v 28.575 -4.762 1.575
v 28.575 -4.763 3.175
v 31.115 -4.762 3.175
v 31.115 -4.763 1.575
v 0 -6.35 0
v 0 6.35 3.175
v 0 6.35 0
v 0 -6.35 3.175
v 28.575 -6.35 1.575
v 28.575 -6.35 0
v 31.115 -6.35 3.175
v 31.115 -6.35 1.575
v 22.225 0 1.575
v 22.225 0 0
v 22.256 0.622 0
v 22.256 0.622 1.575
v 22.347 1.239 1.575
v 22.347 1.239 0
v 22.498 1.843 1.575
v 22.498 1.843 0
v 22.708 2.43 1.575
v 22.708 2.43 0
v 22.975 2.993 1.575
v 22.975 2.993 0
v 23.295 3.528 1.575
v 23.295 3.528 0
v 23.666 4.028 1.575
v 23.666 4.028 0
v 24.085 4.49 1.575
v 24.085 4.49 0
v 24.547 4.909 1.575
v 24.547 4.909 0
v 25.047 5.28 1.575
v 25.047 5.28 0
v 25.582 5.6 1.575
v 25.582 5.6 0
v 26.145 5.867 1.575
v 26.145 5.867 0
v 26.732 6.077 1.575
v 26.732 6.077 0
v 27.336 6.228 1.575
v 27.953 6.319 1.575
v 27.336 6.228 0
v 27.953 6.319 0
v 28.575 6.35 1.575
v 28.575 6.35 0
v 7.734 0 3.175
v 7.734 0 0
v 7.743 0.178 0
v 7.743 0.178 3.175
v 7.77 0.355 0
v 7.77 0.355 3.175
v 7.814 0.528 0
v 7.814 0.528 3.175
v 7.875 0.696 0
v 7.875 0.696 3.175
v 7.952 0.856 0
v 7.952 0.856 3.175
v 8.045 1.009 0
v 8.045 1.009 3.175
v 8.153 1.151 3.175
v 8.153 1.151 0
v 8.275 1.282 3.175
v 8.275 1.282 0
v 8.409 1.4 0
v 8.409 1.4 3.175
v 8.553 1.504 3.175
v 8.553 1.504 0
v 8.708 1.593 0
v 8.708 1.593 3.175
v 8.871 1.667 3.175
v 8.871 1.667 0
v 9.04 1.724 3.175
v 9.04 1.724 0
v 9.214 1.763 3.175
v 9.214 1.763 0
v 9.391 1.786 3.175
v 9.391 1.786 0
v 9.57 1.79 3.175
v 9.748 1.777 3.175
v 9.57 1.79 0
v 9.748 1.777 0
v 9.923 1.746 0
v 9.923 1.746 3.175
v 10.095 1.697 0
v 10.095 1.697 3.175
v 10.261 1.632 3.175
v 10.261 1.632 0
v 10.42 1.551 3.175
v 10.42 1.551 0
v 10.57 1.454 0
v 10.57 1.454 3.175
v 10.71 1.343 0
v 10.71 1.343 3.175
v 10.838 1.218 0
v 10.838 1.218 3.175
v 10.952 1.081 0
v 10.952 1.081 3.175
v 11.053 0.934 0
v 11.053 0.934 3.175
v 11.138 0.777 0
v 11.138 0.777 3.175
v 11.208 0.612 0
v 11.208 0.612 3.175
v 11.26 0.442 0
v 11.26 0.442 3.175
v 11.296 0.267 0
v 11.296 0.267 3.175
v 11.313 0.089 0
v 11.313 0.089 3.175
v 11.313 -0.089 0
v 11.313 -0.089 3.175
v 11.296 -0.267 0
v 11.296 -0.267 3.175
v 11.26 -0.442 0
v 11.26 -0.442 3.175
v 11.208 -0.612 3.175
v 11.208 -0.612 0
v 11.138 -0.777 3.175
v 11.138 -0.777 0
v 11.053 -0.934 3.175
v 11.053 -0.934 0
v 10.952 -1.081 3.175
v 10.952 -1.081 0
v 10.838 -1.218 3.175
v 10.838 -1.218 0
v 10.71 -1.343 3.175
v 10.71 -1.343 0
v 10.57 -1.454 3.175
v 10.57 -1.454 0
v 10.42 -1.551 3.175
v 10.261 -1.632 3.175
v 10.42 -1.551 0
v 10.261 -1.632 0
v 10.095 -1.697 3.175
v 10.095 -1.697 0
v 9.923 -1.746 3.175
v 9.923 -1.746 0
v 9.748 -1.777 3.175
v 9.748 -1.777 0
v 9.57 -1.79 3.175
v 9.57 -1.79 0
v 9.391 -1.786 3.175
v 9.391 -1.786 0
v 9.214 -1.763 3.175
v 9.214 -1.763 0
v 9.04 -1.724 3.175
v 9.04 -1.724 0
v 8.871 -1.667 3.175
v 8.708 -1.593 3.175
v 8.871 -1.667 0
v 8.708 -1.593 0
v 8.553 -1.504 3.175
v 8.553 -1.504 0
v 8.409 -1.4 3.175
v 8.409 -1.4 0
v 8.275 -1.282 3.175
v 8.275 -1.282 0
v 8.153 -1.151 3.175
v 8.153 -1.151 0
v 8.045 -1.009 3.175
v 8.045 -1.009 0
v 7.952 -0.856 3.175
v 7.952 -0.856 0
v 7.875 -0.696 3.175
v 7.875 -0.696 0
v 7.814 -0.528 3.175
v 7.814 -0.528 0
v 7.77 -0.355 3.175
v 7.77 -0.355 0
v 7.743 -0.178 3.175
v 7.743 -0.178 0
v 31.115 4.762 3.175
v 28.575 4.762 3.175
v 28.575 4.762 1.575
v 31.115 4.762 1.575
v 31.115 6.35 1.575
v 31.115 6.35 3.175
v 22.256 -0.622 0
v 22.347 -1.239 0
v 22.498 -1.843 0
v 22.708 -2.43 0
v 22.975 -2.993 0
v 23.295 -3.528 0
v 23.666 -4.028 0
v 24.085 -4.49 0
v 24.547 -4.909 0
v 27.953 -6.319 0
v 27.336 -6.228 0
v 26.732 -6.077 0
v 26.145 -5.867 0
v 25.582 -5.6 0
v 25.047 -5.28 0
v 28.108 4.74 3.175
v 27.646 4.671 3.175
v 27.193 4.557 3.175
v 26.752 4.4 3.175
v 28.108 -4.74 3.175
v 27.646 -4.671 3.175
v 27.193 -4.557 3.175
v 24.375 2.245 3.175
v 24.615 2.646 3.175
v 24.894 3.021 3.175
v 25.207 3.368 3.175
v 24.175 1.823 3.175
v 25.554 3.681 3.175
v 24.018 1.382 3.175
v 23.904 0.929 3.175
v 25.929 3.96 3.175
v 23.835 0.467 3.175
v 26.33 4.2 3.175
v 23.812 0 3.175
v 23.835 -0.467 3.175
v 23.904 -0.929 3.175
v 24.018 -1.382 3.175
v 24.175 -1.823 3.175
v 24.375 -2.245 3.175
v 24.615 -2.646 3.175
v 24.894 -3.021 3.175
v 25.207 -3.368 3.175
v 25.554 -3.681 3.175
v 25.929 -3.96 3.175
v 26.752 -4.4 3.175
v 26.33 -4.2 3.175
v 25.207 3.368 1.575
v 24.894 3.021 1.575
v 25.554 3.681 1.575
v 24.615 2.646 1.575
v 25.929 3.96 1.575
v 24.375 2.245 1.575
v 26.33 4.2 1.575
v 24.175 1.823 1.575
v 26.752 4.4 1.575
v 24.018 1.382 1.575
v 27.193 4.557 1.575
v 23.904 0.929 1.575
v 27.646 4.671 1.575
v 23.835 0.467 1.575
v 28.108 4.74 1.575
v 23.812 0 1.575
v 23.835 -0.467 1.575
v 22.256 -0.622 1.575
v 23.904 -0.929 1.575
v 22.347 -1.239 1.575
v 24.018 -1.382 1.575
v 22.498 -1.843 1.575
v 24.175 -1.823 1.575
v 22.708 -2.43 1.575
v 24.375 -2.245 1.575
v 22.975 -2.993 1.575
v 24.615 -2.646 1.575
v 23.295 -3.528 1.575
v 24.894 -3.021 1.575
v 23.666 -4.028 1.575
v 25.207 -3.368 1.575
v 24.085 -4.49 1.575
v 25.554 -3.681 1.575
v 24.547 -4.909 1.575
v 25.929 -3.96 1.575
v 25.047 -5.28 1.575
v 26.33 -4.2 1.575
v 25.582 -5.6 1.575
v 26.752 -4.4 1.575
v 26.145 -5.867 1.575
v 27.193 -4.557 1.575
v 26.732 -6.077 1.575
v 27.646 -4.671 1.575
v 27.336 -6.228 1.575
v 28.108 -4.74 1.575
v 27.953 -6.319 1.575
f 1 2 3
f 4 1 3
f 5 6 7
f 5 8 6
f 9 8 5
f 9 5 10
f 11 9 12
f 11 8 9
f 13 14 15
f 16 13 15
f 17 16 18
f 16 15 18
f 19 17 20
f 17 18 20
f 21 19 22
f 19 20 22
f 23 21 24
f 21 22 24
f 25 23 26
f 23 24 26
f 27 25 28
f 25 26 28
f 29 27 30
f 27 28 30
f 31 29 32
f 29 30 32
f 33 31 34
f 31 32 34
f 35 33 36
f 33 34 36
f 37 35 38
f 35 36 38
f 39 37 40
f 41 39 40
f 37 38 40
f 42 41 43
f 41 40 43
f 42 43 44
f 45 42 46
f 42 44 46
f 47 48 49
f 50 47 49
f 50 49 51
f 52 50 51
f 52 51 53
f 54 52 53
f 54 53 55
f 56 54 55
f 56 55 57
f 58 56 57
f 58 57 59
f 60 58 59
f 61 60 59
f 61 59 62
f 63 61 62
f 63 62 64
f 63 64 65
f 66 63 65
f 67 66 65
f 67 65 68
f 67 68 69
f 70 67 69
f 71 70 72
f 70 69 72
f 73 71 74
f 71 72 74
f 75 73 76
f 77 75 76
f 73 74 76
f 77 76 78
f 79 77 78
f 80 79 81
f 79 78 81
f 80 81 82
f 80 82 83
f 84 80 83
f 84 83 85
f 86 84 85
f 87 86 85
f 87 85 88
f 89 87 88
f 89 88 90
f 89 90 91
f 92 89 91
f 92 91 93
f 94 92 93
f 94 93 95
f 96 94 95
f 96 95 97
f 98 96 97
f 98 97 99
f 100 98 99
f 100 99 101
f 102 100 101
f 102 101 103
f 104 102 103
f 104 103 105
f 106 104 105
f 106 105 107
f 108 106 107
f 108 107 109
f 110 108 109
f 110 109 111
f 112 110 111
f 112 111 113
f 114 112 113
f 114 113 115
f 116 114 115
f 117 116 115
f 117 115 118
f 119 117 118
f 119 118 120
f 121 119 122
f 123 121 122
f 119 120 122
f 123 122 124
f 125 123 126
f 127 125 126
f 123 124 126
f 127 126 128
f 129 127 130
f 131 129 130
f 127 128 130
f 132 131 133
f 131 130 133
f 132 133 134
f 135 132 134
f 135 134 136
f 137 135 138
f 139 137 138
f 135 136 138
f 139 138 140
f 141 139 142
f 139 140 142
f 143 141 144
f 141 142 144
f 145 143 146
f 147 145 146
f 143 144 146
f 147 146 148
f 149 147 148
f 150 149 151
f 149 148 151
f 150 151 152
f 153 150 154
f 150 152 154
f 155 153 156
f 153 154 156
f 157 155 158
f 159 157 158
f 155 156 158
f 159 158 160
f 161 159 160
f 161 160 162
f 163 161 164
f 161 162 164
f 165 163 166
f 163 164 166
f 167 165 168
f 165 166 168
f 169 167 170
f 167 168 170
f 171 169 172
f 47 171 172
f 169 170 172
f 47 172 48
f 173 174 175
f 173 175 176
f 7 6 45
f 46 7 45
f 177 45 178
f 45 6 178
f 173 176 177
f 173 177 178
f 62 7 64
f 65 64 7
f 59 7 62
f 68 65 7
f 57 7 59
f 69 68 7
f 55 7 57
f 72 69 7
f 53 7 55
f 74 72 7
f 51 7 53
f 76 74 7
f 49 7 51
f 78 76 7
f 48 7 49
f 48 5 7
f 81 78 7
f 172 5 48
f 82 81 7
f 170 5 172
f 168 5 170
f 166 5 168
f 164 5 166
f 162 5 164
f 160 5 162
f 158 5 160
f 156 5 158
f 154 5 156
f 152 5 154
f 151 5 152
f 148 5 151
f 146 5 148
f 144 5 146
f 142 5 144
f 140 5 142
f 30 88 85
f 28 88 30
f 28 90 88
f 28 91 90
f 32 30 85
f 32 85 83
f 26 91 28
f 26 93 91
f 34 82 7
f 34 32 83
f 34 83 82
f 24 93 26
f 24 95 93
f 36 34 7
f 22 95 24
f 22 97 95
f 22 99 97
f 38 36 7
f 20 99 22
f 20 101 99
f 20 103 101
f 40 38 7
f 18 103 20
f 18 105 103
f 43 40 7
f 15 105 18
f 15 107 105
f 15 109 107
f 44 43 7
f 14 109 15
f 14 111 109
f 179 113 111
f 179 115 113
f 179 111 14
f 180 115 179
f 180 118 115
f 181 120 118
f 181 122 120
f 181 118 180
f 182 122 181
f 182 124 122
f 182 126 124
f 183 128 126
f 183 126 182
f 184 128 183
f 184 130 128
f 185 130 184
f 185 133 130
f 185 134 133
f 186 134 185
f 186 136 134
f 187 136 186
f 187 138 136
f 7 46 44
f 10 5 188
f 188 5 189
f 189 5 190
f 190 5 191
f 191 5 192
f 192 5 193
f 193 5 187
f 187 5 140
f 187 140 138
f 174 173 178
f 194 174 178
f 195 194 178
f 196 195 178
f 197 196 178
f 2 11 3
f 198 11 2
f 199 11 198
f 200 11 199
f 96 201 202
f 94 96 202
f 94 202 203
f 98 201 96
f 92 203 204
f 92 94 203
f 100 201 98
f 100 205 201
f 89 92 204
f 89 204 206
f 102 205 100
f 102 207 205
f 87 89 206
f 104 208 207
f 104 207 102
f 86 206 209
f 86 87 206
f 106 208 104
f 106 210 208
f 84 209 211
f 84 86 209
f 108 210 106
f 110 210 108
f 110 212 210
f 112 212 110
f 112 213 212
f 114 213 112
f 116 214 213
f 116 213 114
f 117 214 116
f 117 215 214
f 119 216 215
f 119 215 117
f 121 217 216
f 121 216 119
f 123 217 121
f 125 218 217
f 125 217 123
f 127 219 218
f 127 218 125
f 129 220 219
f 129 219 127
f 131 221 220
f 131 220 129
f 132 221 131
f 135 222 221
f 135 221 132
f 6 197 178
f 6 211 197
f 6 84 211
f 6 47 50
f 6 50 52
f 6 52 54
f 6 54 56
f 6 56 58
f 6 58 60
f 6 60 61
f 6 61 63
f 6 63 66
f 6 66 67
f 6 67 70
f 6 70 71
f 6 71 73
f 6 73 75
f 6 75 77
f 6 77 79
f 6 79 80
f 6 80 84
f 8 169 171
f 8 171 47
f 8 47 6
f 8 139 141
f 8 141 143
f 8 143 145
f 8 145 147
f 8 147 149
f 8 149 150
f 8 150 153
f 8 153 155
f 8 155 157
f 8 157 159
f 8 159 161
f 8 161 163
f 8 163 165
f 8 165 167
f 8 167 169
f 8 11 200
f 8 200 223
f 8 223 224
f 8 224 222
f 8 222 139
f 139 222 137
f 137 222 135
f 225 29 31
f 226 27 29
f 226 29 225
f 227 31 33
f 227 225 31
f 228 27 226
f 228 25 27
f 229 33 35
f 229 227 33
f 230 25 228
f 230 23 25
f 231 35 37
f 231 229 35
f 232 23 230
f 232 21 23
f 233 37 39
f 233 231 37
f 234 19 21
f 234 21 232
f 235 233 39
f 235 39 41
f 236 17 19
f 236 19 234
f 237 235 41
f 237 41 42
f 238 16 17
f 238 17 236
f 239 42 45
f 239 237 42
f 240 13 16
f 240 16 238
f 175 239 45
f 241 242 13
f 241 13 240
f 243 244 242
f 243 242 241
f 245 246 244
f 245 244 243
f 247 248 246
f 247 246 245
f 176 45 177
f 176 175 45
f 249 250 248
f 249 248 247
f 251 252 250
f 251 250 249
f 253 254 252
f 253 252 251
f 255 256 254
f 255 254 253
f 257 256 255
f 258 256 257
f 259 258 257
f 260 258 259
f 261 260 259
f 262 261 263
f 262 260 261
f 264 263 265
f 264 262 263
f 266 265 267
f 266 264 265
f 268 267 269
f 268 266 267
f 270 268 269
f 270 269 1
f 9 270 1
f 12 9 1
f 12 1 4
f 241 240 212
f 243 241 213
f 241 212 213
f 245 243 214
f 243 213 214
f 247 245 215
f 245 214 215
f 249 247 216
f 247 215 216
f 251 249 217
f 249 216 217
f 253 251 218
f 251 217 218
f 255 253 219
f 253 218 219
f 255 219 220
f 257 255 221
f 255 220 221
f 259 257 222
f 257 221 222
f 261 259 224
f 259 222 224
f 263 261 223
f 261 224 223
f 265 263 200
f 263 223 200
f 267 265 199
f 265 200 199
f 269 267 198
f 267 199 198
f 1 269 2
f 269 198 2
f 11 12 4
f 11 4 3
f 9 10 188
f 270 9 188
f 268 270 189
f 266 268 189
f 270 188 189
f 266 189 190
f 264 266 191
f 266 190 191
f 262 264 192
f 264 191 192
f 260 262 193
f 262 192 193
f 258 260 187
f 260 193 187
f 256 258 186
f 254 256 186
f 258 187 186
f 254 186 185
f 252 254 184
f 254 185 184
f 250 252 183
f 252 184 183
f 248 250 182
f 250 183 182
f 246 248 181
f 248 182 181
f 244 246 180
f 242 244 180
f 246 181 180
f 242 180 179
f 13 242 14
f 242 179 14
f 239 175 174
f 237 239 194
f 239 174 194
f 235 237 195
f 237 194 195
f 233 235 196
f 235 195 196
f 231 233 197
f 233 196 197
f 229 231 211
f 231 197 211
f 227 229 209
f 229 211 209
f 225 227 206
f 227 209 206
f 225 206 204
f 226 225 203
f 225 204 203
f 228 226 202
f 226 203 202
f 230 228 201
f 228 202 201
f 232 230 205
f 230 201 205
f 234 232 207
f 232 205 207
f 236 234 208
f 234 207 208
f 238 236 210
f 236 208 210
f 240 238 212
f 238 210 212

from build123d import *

# Parameters (mm, degrees)
F1_DEPTH = 6.35
F2_W     = 2.54
F2_H     = 9.525
F3_DEPTH = 3.176
F4_W     = 2.54
F4_H     = 1.5875
F4_H_2   = 9.525
F5_DEPTH = 1.5748
F7_D     = 3.5814


with BuildPart() as f1:
    # F0 (on Front) → F1 (new body, symmetric)
    with BuildSketch(Plane.XZ):
        Polygon((0, 3.175), (0, 0), (31.115, 0), (31.115, 1.5875), (31.115, 3.175), align=None)
    extrude(amount=F1_DEPTH, both=True)

    # F2 (on face) → F3 (cut, through all)
    with BuildSketch(Plane.XY.offset(3.175)):
        with BuildLine():
            Line((28.575, -4.7625), (28.575, 4.7625))
            ThreePointArc((28.575, 4.7625), (25.2074039664, 3.3675960572), (23.8125, 3.35e-08))
            ThreePointArc((23.8125, 3.35e-08), (25.2074039428, -3.3675960336), (28.575, -4.7625))
        make_face()
        with Locations((29.845, 0)):
            Rectangle(F2_W, F2_H)
    extrude(amount=-F3_DEPTH, mode=Mode.SUBTRACT)

    # F4 (on face) → F5 (cut)
    with BuildSketch(Plane(origin=(0, 0, 0), x_dir=(1, 0, 0), z_dir=(0, 0, -1))):
        with Locations((29.845, 5.55625)):
            Rectangle(F4_W, F4_H)
        with Locations((29.845, 0)):
            Rectangle(F4_W, F4_H_2)
        with BuildLine():
            Line((28.575, 4.7625), (28.575, 6.35))
            ThreePointArc((28.575, 6.35), (24.0848719273, 4.4901280484), (22.225, -3.44e-08))
            ThreePointArc((22.225, -3.44e-08), (24.0848719516, -4.4901280727), (28.575, -6.35))
            Line((28.575, -6.35), (28.575, -4.7625))
            ThreePointArc((28.575, -4.7625), (23.8125, 0), (28.575, 4.7625))
        make_face()
        Polygon((31.115, -5.55625), (31.115, -4.7625), (28.575, -4.7625), (28.575, -6.35), (31.115, -6.35), align=None)
    extrude(amount=-F5_DEPTH, mode=Mode.SUBTRACT)

    # F7 (through all)
    with Locations(Plane.XY.offset(3.175)):
        with Locations((9.525, 0)):
            Hole(F7_D / 2)


solid = f1.part
